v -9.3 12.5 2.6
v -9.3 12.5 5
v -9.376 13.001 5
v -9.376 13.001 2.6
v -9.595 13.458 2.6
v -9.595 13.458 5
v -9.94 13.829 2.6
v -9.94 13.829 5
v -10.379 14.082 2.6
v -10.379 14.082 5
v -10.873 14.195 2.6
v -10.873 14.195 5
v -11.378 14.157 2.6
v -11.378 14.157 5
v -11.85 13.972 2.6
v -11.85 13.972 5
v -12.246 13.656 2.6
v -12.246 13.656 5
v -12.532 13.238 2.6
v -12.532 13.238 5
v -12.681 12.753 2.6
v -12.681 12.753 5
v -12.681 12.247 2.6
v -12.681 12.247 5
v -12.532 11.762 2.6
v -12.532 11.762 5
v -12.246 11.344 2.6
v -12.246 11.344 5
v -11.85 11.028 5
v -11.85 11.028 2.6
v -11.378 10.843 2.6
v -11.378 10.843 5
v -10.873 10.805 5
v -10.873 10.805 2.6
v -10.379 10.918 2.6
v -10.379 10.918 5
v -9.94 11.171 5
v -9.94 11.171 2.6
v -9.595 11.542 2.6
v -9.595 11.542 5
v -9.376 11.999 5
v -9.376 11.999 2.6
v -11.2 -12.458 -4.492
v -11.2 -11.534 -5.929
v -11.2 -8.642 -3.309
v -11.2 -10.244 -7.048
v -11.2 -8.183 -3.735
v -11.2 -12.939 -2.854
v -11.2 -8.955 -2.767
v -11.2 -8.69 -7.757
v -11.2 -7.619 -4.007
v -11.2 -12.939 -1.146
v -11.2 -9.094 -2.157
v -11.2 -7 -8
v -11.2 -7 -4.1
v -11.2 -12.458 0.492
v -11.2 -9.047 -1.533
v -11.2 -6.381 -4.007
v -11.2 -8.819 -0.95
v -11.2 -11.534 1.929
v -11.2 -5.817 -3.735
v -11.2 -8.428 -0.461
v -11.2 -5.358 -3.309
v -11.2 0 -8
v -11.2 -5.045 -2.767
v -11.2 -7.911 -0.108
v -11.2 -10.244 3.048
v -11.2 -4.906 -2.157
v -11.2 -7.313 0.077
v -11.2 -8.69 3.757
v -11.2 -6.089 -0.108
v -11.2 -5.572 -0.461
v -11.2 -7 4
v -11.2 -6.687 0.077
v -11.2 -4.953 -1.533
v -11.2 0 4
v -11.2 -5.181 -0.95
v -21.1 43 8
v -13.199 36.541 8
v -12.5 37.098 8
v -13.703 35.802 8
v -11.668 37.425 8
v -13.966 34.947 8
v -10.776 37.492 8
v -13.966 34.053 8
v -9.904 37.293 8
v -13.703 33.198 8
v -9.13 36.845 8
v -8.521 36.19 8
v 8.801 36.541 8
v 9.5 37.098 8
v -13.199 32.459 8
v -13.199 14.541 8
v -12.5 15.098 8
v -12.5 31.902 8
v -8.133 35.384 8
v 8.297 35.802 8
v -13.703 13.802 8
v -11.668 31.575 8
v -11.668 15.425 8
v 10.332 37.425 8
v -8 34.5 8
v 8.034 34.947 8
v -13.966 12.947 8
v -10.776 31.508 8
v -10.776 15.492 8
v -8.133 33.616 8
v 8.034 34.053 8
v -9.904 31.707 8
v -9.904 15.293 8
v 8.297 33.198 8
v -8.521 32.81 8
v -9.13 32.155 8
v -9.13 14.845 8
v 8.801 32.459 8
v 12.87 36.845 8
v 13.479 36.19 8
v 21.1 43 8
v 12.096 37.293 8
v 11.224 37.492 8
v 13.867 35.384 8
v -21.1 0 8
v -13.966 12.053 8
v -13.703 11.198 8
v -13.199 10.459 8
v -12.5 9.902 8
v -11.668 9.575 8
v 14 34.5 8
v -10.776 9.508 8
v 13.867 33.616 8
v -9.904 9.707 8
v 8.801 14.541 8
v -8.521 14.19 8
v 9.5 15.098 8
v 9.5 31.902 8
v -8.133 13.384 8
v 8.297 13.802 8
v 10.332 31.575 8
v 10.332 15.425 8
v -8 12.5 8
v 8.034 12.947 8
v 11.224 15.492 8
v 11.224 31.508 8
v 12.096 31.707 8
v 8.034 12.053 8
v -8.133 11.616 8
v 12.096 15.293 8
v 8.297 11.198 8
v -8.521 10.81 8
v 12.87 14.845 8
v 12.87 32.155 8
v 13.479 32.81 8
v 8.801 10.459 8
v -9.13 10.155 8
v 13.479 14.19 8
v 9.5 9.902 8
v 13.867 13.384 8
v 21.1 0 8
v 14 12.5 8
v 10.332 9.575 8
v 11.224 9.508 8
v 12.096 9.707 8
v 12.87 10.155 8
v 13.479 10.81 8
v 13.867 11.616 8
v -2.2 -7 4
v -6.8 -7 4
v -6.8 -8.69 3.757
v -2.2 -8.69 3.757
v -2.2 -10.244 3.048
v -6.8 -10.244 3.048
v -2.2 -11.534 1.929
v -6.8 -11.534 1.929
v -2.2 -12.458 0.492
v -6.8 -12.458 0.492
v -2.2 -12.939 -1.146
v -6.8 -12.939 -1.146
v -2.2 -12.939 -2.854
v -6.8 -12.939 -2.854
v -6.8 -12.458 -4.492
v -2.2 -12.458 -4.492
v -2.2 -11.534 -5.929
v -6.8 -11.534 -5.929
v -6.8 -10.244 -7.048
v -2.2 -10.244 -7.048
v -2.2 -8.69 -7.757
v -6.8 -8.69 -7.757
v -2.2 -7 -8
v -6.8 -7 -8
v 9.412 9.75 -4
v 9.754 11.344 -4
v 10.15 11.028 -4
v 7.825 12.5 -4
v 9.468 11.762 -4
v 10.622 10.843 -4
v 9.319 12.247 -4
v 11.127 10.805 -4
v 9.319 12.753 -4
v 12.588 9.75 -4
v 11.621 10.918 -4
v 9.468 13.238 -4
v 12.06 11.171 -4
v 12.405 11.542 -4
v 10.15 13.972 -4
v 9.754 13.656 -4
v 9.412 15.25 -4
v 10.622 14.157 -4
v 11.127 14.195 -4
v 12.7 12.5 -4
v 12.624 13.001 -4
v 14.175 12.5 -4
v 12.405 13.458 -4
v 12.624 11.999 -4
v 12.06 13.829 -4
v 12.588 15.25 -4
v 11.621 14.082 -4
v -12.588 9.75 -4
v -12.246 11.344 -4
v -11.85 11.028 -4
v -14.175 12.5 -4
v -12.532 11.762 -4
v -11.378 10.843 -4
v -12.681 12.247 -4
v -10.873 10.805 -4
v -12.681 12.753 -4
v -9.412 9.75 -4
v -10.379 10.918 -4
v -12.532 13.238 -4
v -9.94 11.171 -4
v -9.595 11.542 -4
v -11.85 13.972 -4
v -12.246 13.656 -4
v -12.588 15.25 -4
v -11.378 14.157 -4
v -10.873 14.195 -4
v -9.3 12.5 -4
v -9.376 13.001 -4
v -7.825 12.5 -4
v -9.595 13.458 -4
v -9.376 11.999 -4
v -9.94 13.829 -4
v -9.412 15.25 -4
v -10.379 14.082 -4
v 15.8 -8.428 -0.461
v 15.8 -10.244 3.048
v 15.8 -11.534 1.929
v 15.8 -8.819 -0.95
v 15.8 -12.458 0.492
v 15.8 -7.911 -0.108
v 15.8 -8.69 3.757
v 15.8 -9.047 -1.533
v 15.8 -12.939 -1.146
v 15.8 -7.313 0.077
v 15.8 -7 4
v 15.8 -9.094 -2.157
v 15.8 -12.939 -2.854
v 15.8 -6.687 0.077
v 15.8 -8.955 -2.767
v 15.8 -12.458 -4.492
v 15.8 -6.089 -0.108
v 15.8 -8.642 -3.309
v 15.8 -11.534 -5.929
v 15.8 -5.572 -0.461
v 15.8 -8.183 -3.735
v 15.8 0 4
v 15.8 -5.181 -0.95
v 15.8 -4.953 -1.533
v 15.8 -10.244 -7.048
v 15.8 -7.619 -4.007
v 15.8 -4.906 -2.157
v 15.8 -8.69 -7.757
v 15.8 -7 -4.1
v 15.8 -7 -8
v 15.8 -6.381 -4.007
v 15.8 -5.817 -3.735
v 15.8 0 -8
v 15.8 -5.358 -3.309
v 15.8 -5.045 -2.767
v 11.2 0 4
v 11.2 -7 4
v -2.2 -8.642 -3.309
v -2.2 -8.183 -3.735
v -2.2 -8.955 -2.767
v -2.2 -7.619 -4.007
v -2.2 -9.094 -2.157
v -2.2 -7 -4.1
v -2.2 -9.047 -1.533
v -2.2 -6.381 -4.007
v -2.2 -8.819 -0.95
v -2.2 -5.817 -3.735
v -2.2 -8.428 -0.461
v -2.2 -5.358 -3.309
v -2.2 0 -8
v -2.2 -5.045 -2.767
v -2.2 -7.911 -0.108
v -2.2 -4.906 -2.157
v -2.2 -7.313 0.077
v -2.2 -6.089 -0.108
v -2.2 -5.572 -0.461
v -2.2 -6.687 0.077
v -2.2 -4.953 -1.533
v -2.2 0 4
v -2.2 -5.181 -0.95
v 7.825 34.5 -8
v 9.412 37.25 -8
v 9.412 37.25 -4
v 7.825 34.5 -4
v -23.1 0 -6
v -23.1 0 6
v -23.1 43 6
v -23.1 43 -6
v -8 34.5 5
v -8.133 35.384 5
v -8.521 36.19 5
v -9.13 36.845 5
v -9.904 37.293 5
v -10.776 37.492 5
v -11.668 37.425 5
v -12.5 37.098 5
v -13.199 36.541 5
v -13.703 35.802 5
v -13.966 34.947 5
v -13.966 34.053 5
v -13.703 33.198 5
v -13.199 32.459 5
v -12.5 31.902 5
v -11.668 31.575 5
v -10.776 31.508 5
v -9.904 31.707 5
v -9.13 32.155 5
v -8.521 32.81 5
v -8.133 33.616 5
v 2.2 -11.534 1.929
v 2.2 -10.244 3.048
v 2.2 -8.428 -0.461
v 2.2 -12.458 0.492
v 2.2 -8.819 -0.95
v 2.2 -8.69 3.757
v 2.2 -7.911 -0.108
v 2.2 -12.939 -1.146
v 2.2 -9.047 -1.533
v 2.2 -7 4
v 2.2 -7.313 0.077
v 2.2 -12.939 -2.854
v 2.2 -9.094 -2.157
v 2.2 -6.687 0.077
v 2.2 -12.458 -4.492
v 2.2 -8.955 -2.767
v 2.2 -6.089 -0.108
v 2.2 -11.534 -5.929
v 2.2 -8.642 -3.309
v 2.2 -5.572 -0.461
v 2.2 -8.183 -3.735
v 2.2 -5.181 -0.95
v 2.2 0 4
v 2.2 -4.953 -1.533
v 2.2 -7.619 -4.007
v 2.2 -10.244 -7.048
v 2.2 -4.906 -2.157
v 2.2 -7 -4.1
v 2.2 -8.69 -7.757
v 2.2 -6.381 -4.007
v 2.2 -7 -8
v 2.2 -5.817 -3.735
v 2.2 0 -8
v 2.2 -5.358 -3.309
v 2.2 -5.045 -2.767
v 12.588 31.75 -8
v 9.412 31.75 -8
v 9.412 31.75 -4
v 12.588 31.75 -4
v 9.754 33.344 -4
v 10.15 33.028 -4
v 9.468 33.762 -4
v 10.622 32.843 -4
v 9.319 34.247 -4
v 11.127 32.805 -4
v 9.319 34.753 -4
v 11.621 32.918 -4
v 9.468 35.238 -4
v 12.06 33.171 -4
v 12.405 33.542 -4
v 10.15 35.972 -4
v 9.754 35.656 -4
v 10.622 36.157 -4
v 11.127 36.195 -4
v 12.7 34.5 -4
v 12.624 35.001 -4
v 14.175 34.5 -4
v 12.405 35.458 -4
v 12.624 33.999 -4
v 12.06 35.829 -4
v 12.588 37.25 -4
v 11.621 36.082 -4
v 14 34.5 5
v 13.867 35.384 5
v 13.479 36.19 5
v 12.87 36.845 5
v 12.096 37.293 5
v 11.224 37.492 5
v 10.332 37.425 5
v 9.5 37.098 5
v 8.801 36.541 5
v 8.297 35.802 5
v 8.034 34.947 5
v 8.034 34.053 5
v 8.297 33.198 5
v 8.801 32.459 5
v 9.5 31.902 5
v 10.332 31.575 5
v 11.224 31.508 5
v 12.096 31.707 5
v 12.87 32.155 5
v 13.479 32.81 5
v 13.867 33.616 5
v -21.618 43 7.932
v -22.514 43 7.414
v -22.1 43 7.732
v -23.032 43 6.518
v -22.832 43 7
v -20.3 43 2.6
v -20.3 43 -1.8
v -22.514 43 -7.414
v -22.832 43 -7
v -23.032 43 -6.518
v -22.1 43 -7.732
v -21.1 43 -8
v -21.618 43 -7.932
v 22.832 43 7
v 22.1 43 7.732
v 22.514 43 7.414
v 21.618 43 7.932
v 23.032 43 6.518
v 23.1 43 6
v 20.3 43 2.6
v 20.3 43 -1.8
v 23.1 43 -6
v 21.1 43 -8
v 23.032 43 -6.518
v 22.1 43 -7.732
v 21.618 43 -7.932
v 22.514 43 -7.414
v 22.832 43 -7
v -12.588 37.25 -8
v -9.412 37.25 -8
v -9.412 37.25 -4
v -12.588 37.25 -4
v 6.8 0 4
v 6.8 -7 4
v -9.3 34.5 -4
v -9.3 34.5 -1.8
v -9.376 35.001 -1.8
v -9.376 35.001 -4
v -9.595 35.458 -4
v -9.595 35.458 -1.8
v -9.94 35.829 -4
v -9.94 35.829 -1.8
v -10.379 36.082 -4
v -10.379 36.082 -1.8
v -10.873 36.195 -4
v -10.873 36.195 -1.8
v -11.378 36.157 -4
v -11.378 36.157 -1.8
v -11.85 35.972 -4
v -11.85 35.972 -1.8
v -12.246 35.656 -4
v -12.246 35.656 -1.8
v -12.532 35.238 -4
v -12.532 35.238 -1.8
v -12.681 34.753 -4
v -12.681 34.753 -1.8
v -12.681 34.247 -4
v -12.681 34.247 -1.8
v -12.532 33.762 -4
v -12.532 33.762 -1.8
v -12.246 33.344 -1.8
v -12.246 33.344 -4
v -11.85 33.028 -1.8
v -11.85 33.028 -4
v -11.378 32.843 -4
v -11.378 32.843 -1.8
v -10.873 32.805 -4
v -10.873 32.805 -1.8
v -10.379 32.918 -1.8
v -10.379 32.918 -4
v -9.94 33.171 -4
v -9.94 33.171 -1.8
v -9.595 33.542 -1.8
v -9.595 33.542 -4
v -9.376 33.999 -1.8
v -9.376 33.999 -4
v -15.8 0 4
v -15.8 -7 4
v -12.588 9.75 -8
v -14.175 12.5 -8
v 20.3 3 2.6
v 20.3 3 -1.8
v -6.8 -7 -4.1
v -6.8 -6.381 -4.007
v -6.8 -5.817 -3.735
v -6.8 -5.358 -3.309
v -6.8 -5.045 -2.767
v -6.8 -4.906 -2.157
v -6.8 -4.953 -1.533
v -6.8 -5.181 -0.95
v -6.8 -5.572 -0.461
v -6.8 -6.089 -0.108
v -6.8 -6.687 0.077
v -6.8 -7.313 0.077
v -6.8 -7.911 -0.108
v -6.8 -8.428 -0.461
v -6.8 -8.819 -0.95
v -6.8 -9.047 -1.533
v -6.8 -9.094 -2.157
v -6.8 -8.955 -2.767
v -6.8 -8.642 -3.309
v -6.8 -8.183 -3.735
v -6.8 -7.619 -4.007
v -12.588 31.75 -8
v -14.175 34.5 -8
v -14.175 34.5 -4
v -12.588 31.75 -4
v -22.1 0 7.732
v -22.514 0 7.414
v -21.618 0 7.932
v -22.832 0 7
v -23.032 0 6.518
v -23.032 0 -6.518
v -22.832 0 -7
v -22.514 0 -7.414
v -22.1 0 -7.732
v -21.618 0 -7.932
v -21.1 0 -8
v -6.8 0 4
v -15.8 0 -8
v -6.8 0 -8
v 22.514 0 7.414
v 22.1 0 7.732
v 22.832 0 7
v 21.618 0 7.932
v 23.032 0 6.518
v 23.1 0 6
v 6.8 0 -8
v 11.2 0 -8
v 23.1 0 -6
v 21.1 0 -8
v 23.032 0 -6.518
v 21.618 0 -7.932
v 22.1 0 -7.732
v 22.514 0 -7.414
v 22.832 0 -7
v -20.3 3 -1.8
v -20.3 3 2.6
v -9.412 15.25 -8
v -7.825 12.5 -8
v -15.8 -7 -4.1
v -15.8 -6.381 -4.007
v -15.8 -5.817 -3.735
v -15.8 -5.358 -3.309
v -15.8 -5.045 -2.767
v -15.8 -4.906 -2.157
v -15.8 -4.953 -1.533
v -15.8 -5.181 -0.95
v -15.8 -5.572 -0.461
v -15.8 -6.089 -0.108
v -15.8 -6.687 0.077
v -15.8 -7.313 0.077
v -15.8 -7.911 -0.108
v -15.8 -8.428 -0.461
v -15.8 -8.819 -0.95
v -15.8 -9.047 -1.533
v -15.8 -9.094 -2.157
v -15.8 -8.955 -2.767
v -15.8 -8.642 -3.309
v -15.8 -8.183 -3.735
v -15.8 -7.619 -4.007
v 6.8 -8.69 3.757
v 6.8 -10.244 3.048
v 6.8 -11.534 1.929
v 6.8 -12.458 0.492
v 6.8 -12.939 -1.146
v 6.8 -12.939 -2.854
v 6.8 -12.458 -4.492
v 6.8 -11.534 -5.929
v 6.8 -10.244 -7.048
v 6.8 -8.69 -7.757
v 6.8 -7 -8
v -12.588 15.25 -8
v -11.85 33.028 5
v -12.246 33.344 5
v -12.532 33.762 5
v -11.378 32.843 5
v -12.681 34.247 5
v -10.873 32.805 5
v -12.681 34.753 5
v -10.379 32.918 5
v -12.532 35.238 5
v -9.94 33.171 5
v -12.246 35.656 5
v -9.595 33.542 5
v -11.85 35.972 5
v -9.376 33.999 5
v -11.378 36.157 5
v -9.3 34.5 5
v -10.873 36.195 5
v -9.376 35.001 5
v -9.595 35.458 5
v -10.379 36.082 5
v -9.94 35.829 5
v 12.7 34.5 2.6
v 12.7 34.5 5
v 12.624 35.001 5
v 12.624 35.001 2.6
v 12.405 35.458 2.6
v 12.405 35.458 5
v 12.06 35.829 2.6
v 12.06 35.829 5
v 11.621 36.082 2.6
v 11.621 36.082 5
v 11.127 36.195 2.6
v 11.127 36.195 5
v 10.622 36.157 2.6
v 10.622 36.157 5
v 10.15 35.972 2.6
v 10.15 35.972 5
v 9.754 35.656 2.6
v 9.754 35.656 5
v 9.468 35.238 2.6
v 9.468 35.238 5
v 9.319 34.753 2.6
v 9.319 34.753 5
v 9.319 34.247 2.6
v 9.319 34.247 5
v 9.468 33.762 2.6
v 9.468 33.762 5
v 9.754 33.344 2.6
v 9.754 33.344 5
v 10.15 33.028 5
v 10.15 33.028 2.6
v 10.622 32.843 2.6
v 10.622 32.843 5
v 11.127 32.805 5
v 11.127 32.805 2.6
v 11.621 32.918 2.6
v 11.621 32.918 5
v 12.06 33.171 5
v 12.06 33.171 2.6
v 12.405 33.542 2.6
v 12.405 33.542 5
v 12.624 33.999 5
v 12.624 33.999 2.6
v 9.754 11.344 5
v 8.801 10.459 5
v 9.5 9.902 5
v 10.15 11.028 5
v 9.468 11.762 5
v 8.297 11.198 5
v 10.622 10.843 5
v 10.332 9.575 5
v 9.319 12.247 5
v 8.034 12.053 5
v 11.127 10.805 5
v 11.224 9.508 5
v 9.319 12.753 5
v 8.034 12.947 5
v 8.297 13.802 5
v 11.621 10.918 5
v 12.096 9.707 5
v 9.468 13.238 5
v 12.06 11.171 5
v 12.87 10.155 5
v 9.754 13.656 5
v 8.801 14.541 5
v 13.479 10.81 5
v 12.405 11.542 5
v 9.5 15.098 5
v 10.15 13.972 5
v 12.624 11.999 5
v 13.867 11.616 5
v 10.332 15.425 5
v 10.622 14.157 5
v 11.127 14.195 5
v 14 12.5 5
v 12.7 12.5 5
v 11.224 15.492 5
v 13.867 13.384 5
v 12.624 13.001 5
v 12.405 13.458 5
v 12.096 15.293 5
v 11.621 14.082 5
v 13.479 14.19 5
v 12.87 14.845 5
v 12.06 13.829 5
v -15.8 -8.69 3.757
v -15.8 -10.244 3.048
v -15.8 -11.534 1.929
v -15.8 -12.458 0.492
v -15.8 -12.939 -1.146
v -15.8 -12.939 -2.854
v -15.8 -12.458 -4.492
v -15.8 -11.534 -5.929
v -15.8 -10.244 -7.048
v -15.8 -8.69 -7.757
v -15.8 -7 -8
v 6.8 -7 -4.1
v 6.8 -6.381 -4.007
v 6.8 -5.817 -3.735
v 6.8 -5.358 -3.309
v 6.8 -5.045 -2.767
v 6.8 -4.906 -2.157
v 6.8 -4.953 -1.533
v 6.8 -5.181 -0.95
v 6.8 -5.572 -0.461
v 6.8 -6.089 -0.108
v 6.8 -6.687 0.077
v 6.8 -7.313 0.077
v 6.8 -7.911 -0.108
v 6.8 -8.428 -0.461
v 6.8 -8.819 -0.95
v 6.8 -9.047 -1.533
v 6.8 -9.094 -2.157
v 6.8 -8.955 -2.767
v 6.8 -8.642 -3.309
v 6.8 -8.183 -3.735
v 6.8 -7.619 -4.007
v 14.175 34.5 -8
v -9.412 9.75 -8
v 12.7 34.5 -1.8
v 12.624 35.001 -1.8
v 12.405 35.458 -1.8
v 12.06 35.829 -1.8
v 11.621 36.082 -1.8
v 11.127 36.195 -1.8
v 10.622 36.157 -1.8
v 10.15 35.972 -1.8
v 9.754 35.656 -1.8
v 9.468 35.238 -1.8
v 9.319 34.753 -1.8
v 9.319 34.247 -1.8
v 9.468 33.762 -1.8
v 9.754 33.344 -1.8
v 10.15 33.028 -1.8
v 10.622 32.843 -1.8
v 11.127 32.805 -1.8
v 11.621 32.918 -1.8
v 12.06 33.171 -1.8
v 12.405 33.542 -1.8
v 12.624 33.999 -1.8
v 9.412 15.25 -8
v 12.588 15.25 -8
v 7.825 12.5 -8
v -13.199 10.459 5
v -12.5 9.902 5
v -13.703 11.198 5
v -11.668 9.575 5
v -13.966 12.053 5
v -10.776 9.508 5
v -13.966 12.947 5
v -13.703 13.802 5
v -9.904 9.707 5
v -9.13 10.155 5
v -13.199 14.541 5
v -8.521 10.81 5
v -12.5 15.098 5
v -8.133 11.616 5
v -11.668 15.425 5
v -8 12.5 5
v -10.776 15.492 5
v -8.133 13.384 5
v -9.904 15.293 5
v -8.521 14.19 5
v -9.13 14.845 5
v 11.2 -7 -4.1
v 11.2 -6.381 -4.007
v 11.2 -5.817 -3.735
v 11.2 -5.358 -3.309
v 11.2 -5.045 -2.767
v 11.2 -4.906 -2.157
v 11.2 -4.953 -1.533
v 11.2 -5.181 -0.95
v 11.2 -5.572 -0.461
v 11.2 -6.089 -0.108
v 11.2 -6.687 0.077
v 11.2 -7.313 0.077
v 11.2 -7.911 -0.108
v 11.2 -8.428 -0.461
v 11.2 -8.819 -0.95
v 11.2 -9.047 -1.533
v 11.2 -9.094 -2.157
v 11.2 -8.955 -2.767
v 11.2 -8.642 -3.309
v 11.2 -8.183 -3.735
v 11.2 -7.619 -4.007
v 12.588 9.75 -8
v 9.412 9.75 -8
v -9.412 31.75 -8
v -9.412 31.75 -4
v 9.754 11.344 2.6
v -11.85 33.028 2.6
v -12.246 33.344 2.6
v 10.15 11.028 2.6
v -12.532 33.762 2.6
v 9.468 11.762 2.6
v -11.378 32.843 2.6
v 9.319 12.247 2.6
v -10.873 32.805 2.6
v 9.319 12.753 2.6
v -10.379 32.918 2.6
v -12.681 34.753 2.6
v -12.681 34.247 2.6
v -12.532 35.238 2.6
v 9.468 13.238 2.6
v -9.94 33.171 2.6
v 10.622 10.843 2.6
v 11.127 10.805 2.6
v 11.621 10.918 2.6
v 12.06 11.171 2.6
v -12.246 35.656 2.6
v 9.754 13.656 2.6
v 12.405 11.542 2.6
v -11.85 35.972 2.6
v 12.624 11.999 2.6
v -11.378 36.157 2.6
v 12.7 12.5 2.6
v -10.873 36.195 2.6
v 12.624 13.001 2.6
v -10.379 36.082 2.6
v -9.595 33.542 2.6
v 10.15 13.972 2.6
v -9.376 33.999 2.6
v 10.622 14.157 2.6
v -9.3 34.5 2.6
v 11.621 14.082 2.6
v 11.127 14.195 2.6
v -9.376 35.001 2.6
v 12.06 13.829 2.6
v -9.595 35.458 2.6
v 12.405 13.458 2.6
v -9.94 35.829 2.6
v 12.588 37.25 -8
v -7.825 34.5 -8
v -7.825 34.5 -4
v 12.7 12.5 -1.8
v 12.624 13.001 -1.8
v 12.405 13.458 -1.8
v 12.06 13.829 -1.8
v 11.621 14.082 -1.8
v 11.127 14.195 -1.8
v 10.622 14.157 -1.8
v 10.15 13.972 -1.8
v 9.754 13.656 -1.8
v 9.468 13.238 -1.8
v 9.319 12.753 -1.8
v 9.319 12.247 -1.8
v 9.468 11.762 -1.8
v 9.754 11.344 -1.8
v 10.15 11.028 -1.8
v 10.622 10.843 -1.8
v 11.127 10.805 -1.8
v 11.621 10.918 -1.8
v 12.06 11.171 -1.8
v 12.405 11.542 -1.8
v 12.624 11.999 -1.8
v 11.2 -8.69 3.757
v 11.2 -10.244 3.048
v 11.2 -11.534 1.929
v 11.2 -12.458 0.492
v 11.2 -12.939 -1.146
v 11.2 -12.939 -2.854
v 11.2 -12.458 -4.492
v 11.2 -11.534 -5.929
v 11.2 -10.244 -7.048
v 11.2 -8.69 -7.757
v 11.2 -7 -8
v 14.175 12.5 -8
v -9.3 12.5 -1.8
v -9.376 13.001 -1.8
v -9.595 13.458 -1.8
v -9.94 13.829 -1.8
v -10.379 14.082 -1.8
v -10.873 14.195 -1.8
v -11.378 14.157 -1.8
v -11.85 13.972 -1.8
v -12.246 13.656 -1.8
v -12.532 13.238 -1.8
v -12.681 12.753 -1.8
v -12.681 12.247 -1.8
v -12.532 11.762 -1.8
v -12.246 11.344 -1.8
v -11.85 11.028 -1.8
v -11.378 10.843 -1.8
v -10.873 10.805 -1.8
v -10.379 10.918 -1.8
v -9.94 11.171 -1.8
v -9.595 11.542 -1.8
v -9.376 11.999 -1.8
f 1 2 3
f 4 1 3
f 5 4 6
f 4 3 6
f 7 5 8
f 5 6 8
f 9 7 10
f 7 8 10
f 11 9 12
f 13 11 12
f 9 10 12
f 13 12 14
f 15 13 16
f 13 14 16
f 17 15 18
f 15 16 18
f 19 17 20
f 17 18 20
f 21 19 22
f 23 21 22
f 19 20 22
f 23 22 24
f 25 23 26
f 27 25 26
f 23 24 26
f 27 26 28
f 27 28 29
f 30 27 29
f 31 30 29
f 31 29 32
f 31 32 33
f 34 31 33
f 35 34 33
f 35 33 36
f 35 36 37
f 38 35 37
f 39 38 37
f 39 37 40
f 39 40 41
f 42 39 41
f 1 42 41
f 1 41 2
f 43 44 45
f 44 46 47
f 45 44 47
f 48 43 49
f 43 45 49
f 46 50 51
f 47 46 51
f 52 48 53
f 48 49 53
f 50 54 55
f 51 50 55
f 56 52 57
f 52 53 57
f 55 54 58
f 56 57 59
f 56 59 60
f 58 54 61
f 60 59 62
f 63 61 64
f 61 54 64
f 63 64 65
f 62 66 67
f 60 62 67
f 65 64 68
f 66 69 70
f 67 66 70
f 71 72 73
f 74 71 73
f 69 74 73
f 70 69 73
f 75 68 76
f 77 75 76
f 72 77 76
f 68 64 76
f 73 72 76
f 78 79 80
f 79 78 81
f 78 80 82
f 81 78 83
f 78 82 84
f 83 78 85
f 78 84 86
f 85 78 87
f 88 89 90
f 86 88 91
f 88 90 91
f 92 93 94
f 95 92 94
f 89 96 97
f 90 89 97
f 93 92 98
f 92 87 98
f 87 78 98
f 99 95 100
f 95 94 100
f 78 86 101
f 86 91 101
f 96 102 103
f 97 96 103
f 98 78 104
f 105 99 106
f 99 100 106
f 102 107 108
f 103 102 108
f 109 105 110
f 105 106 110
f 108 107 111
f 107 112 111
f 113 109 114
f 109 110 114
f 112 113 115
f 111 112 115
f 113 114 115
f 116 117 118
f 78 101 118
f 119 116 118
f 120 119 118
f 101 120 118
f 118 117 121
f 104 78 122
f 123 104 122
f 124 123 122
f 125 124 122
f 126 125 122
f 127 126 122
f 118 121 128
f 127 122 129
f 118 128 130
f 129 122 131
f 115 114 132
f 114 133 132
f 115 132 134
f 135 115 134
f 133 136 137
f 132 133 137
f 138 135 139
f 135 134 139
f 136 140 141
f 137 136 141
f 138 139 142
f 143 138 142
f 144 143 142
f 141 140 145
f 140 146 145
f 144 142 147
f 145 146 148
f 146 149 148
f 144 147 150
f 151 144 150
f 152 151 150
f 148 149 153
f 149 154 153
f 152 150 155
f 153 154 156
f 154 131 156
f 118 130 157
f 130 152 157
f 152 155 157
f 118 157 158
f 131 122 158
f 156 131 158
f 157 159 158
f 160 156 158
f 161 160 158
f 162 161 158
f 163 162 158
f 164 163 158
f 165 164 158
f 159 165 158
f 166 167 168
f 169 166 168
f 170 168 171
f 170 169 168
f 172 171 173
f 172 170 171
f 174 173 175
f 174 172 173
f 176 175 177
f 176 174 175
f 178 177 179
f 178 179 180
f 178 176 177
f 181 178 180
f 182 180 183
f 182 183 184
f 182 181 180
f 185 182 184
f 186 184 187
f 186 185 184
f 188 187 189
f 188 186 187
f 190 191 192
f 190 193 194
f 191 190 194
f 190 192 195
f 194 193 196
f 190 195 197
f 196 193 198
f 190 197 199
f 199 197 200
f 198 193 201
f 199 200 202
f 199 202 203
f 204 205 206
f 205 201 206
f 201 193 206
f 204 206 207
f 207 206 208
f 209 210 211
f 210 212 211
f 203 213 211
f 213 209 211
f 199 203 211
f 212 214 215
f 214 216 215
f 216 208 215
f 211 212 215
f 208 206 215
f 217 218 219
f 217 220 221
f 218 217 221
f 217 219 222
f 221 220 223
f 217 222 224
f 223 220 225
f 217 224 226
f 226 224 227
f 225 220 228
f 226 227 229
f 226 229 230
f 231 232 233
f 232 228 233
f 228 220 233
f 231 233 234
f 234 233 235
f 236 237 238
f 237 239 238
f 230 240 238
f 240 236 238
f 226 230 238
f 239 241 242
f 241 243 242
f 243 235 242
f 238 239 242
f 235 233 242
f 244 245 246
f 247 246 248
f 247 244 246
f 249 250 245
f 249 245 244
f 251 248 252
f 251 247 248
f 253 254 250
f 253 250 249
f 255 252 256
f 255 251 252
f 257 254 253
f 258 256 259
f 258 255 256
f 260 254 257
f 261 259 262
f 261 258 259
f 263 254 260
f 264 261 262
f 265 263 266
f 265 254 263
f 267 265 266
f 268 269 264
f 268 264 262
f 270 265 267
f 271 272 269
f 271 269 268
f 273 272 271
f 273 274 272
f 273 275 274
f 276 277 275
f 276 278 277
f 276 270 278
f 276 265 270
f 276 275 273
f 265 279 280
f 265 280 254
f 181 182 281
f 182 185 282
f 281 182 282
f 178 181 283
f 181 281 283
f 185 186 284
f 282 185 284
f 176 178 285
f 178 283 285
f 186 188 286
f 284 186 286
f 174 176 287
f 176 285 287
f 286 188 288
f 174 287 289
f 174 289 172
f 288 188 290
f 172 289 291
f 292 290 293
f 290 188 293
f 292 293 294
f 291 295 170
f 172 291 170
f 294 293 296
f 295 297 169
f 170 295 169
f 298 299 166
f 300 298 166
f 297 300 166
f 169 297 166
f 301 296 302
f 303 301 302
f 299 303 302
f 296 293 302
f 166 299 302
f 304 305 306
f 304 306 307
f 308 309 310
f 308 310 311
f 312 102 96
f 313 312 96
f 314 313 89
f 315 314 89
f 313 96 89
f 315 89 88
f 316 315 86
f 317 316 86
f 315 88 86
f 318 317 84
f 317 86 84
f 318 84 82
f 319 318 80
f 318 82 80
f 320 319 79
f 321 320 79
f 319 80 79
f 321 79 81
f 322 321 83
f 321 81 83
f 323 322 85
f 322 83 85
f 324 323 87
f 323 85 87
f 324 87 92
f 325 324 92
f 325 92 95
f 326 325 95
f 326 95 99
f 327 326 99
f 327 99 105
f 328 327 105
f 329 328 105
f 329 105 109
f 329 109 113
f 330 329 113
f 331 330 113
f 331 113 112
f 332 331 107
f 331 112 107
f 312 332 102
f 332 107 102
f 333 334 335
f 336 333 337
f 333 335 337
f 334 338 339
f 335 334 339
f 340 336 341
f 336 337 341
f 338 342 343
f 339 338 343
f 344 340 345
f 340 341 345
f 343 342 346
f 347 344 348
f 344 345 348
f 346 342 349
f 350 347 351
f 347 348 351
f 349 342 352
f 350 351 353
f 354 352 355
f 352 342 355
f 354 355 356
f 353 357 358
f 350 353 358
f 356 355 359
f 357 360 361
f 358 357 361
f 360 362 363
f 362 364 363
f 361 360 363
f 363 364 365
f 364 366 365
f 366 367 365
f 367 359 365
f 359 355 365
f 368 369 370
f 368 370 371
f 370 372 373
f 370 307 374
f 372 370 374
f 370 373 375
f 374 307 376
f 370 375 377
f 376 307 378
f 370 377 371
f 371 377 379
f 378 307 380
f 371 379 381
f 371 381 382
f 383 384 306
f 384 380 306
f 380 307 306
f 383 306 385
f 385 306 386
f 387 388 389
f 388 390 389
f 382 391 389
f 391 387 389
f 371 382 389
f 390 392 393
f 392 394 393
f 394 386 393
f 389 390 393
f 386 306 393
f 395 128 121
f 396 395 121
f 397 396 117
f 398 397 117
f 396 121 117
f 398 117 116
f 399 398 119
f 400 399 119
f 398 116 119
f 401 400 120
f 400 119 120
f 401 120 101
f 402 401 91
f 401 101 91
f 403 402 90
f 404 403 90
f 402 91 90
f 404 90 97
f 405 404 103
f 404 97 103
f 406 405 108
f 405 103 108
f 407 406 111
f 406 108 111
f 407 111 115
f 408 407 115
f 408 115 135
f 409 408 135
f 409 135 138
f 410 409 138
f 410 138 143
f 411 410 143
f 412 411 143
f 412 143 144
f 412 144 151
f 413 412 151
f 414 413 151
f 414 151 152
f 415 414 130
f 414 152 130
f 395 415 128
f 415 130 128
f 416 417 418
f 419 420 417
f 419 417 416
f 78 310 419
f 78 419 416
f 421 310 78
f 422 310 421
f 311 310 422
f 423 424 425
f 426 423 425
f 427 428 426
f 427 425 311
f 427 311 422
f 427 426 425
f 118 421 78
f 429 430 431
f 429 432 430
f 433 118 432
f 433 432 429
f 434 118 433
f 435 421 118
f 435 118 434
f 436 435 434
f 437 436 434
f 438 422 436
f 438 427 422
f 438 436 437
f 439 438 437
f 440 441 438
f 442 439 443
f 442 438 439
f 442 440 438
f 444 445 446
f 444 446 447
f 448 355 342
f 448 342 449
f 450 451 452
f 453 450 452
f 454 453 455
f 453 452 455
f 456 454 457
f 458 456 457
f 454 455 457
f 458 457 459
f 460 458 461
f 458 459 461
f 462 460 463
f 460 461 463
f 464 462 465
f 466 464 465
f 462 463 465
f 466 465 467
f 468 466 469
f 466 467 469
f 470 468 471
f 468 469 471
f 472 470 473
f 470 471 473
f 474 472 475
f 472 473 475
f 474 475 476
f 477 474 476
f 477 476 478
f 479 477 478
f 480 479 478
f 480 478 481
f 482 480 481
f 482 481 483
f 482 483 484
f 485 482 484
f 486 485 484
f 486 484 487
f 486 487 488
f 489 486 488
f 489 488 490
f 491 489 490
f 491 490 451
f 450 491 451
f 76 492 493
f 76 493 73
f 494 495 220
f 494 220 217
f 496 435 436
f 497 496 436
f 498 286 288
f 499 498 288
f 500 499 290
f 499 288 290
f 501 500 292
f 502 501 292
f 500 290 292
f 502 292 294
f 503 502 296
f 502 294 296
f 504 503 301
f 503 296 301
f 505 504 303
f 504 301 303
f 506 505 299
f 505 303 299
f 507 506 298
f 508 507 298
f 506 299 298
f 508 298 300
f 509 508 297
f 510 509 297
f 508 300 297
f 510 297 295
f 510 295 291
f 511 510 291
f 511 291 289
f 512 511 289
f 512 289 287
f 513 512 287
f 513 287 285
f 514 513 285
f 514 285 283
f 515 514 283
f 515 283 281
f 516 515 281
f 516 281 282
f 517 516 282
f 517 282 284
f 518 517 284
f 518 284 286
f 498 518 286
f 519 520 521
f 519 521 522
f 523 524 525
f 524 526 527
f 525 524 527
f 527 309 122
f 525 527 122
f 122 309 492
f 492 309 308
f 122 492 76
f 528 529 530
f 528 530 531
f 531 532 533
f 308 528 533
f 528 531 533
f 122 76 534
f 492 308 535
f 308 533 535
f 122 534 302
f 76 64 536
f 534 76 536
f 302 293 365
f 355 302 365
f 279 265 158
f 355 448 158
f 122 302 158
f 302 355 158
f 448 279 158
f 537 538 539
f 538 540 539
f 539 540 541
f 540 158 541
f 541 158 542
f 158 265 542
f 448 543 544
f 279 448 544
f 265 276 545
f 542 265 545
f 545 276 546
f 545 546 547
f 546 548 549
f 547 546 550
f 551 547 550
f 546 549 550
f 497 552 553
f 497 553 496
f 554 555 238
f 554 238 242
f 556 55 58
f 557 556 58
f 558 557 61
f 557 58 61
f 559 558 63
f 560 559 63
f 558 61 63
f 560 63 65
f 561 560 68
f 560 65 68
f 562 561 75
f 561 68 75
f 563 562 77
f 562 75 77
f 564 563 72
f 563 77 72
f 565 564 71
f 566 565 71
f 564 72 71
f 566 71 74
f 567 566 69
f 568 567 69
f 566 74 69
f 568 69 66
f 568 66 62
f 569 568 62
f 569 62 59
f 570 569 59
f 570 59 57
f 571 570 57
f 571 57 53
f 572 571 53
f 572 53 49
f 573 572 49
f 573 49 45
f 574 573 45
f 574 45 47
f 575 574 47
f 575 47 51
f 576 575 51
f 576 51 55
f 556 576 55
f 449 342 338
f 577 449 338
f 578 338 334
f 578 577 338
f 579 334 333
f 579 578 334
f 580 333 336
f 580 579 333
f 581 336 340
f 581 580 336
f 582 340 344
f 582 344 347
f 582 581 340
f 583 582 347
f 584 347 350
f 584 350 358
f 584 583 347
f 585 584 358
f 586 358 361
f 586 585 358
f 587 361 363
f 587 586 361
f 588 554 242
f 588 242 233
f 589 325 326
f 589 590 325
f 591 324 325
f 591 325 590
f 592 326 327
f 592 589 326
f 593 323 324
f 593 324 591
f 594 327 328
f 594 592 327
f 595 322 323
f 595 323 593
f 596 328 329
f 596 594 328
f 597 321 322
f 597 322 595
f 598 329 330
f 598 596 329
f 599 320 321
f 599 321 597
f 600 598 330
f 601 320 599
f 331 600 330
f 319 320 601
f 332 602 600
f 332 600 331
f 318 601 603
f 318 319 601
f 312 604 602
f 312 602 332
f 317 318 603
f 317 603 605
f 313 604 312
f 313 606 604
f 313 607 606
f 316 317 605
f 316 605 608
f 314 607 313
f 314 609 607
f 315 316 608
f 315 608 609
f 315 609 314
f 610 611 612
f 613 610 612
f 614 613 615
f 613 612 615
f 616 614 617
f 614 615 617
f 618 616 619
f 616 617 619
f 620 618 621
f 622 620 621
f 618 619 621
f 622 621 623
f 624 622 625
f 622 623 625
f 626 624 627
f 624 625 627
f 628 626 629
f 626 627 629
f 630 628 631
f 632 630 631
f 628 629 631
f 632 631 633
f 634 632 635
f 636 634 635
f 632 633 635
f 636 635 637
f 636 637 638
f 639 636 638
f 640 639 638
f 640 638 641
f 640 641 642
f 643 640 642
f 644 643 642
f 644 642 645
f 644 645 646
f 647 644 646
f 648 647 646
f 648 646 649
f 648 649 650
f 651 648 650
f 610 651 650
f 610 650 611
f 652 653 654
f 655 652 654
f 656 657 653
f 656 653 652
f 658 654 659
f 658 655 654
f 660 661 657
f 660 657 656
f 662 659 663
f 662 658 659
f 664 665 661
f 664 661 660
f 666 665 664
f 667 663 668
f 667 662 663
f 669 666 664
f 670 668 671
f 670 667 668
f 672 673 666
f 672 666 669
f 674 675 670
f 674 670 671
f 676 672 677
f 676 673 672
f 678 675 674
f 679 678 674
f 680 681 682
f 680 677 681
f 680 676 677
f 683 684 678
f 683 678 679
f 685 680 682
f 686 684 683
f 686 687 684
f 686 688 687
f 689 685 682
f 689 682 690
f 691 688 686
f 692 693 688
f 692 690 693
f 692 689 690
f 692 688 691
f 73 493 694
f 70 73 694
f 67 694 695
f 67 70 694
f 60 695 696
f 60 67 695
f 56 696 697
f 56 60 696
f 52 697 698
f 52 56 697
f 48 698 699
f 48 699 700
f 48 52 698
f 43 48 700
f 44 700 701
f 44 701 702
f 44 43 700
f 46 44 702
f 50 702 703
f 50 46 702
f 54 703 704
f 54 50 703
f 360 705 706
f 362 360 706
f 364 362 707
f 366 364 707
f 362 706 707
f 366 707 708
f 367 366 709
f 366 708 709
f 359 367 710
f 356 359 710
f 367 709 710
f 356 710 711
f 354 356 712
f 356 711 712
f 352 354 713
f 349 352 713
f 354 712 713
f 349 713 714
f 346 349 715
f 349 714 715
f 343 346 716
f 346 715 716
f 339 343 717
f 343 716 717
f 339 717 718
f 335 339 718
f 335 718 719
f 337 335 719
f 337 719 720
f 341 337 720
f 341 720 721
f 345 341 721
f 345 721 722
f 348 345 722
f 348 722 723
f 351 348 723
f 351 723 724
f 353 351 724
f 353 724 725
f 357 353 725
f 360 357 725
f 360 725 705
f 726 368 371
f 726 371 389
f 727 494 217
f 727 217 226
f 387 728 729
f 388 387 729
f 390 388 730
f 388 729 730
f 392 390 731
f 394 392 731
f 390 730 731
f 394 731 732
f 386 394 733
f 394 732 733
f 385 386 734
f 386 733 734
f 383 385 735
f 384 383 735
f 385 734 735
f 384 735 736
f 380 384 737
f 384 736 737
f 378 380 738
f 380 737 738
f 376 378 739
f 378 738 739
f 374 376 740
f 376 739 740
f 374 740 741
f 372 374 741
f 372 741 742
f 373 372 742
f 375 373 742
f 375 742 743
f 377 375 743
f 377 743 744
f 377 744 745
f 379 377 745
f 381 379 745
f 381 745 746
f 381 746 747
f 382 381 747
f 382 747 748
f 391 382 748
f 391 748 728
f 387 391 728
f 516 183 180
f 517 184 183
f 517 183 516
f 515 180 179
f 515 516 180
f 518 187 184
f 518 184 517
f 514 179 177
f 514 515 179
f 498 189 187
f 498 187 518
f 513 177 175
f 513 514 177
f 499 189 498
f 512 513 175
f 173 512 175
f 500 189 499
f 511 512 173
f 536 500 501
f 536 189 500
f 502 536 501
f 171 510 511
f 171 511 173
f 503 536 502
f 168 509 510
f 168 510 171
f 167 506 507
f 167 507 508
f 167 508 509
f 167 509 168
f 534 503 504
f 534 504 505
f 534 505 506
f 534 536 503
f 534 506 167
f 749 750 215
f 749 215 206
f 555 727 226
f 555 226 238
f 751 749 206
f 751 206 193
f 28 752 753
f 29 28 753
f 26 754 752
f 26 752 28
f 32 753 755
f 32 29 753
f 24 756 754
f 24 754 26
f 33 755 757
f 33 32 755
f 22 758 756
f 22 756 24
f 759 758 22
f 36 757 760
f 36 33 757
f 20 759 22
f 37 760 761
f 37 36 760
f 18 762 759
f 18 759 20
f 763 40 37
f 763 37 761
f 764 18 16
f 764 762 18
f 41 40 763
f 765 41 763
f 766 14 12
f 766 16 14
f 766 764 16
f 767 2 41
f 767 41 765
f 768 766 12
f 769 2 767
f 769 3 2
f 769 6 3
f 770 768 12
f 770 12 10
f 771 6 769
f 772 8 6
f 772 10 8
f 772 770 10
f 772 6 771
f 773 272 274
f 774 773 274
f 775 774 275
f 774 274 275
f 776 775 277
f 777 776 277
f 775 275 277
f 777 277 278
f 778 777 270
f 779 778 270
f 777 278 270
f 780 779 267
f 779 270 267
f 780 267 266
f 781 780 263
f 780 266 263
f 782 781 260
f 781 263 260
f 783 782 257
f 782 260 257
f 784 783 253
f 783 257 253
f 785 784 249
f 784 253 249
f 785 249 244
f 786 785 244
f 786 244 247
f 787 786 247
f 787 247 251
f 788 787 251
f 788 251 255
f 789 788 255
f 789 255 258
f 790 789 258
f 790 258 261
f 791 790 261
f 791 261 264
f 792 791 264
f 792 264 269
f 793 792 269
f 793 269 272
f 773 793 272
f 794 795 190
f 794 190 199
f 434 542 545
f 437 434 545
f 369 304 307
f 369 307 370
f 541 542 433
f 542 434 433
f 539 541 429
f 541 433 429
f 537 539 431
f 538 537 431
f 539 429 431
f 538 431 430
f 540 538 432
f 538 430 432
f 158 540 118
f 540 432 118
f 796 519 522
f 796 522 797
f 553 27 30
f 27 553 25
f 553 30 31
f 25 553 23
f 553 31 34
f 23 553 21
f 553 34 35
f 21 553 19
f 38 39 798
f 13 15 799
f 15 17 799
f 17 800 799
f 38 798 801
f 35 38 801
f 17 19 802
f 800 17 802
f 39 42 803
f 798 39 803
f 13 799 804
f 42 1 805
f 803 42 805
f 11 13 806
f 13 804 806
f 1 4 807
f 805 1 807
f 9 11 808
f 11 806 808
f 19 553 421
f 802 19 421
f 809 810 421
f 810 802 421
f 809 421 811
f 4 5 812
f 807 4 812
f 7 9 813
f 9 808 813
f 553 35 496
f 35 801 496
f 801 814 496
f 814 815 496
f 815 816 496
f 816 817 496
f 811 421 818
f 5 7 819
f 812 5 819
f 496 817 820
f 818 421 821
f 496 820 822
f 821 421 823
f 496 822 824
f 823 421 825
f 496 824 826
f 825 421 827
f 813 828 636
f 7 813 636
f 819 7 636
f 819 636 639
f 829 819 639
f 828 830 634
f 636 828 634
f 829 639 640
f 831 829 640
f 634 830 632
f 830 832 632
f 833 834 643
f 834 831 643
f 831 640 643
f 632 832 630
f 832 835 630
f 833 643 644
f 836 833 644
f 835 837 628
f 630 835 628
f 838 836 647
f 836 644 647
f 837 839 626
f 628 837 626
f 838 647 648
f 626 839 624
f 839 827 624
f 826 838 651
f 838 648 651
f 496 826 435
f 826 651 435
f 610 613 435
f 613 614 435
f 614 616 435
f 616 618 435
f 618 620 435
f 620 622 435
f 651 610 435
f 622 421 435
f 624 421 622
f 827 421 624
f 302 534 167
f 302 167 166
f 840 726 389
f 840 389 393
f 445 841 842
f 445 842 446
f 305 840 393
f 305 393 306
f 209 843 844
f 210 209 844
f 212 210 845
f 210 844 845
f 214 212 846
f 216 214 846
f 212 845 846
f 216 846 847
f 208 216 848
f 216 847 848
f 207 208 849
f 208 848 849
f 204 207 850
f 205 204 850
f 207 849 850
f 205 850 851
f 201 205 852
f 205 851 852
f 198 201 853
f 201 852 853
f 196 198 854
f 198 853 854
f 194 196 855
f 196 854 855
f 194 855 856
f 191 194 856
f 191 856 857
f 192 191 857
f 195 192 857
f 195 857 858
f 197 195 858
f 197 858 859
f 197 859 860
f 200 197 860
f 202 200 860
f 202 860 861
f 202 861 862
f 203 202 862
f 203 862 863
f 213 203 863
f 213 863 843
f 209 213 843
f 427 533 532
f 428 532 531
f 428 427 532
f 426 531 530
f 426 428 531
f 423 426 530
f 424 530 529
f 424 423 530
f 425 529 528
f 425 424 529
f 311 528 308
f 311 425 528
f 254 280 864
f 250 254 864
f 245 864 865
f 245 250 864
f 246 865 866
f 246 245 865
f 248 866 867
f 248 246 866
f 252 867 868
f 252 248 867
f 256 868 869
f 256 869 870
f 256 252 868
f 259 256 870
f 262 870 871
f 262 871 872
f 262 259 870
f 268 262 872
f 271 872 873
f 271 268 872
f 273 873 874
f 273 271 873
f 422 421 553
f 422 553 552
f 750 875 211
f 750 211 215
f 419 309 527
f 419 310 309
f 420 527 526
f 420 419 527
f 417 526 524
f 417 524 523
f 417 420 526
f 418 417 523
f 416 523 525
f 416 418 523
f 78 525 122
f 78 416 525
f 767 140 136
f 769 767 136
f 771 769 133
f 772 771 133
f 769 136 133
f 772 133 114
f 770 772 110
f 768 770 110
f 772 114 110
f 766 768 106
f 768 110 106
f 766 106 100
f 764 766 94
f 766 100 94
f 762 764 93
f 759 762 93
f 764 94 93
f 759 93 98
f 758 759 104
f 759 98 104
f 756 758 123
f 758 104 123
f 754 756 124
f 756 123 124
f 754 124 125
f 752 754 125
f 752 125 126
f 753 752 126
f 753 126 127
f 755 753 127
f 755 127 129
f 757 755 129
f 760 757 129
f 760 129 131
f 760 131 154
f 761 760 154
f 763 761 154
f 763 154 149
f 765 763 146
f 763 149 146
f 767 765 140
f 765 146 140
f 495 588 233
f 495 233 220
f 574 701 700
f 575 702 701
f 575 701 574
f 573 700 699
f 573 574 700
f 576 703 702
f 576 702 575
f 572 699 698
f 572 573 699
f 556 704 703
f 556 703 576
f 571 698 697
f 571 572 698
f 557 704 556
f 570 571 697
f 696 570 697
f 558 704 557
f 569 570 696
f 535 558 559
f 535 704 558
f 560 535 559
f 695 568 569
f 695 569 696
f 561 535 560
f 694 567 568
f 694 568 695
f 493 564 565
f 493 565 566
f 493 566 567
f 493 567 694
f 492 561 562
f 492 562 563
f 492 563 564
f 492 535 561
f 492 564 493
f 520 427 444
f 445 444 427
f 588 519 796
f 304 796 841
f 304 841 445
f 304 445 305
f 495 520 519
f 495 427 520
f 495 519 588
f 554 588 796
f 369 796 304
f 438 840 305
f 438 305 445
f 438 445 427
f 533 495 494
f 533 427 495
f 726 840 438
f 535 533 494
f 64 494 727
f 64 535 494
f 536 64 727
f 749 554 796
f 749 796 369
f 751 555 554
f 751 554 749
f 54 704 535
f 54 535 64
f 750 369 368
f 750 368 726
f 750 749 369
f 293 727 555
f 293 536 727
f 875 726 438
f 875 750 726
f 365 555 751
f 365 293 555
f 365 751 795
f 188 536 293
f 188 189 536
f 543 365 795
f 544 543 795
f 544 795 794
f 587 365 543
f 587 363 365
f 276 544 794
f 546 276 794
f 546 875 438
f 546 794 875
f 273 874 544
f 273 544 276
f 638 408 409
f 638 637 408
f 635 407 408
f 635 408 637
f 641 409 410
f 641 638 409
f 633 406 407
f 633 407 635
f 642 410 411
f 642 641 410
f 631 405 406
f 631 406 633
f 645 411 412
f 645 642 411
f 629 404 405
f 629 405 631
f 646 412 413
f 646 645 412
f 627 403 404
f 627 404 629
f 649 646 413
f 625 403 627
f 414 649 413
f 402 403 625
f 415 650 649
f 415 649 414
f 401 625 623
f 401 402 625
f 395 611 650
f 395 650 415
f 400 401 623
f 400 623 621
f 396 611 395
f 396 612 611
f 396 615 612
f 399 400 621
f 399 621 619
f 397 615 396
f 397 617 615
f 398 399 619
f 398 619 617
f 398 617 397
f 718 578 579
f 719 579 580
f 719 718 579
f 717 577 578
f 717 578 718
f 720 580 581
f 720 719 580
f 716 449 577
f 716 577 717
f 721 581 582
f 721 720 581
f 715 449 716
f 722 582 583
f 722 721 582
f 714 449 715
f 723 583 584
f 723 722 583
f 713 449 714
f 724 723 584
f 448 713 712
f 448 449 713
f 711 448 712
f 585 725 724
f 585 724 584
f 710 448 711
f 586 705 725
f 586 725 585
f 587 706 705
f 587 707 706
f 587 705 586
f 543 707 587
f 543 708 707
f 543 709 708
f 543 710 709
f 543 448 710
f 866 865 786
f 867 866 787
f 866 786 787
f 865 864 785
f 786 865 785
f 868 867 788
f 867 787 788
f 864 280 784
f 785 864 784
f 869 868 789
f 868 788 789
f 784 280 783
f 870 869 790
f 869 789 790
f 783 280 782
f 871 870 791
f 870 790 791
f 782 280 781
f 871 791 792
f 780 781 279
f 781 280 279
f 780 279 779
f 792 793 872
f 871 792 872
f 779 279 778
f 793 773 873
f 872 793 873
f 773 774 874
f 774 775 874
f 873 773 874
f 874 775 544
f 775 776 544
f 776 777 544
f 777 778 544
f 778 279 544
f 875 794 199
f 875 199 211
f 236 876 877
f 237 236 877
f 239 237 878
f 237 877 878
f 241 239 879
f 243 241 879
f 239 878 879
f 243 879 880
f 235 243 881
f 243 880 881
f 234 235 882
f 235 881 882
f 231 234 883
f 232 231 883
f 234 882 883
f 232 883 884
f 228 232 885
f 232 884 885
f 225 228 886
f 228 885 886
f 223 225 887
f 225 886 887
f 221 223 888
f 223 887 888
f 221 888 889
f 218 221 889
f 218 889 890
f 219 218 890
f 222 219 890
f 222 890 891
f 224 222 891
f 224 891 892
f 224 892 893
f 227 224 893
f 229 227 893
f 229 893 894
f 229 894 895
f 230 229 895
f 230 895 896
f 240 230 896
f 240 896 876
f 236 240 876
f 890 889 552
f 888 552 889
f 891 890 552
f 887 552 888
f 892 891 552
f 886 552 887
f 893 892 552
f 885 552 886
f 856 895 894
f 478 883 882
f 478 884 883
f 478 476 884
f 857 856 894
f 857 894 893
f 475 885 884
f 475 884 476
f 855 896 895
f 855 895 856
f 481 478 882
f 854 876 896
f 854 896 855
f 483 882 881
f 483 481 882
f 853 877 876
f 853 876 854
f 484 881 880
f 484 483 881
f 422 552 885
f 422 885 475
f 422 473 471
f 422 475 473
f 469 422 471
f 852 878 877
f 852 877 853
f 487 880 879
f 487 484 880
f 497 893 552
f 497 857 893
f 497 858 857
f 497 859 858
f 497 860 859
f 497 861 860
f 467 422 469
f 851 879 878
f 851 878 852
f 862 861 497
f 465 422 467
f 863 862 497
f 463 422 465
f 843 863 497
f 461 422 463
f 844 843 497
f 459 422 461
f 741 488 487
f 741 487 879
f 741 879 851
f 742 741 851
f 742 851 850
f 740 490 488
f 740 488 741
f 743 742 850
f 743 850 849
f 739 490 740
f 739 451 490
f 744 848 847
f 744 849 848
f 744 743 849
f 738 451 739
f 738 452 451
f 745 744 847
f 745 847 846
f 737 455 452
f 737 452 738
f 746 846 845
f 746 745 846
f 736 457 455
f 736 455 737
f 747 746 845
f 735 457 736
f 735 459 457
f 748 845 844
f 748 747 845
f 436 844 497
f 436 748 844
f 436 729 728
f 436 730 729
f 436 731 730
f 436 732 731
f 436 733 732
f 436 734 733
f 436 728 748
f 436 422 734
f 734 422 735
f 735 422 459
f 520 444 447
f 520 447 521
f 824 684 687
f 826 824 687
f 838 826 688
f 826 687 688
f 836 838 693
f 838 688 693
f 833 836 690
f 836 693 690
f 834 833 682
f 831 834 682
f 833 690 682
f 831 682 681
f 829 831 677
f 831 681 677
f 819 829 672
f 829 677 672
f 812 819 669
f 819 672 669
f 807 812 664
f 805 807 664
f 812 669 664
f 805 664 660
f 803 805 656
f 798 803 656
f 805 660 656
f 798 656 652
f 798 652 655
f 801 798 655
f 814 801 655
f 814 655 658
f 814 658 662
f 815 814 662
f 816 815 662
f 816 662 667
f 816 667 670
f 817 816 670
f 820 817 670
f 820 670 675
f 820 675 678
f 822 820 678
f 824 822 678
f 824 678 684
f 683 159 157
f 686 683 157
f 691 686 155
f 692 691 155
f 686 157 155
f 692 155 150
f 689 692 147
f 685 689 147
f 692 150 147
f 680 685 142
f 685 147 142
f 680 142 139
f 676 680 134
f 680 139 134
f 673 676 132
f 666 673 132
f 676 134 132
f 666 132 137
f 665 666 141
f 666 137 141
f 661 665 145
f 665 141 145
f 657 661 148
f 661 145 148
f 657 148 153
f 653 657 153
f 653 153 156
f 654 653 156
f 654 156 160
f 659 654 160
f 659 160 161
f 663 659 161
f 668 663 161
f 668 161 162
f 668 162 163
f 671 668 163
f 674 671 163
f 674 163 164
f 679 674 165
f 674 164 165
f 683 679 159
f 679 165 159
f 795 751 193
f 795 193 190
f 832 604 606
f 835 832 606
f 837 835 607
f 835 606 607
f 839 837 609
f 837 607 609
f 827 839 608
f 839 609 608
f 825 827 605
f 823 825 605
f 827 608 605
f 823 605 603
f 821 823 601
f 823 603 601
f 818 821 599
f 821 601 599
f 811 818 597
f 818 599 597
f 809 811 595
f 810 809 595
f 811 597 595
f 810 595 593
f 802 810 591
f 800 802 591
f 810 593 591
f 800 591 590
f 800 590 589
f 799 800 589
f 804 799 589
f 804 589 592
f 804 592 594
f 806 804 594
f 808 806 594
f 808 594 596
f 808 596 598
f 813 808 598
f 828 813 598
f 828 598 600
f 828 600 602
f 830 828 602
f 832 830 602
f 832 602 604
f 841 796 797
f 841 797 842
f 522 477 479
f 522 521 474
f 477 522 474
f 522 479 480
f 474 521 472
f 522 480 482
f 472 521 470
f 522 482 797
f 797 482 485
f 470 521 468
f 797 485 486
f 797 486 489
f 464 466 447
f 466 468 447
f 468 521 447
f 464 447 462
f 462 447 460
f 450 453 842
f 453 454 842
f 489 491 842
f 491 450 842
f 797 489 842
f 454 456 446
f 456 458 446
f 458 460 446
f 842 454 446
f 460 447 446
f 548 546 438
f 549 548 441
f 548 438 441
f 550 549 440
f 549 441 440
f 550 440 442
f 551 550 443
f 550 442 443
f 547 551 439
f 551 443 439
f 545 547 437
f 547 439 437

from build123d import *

# Parameters (mm, degrees)
SKETCH1_W            = 46.2
SKETCH1_H            = 16
BOSS_EXTRUDE1_DEPTH  = 43
SKETCH2_W            = 4.6
SKETCH2_H            = 12
BOSS_EXTRUDE2_DEPTH  = 7
SKETCH8_R            = 6
BOSS_EXTRUDE3_DEPTH  = 4.6
LPATTERN1_COUNT      = 4
LPATTERN1_PITCH      = 9
SKETCH4_R            = 2.1
CUT_EXTRUDE1_DEPTH   = 39.9
SKETCH6_W            = 40.6
SKETCH6_H            = 4.4
CUT_EXTRUDE2_DEPTH   = 40
SKETCH9_R            = 1.7
CUT_EXTRUDE3_DEPTH   = 17
FILLET2_R            = 2
CUT_EXTRUDE4_DEPTH   = 4
LPATTERN2_COUNT      = 2
LPATTERN2_PITCH      = 22
LPATTERN2_COUNT_DIR2 = 2
LPATTERN2_PITCH_DIR2 = 22
SKETCH11_R           = 3
CUT_EXTRUDE5_DEPTH   = 3


with BuildPart() as part:
    # Sketch1 → Boss-Extrude1 (new body)
    with BuildSketch(Plane(origin=(0, 0, 0), x_dir=(1, 0, 0), z_dir=(0, 1, 0))):
        Rectangle(SKETCH1_W, SKETCH1_H)
    extrude(amount=BOSS_EXTRUDE1_DEPTH)

    # Sketch2 → Boss-Extrude2 (add)
    with BuildSketch(Plane.XZ):
        with Locations((13.5, -2)):
            Rectangle(SKETCH2_W, SKETCH2_H)
    boss_extrude2 = extrude(amount=BOSS_EXTRUDE2_DEPTH)

    # Sketch8 → Boss-Extrude3 (add)
    with BuildSketch(Plane(origin=(15.8, 0, 0), x_dir=(0, 0, -1), z_dir=(1, 0, 0))):
        with Locations((2, -7)):
            Circle(SKETCH8_R)
    boss_extrude3 = extrude(amount=-BOSS_EXTRUDE3_DEPTH)

    # LPattern1: Boss-Extrude2, Boss-Extrude3 ×4
    with Locations(*[(-i * LPATTERN1_PITCH, 0, 0) for i in range(1, LPATTERN1_COUNT)]):
        add(boss_extrude2)
        add(boss_extrude3)

    # Sketch4 → Cut-Extrude1 (cut, through all)
    with BuildSketch(Plane(origin=(15.8, 0, 0), x_dir=(0, 0, -1), z_dir=(1, 0, 0))):
        with Locations((2, -7)):
            Circle(SKETCH4_R)
    extrude(amount=-CUT_EXTRUDE1_DEPTH, mode=Mode.SUBTRACT)

    # Sketch6 → Cut-Extrude2 (cut)
    with BuildSketch(Plane(origin=(0, 43, 0), x_dir=(1, 0, 0), z_dir=(0, 1, 0))):
        with Locations((0, -0.4)):
            Rectangle(SKETCH6_W, SKETCH6_H)
    extrude(amount=-CUT_EXTRUDE2_DEPTH, mode=Mode.SUBTRACT)

    # Sketch9 → Cut-Extrude3 (cut, through all)
    with BuildSketch(Plane.XY.offset(8)):
        with Locations((11, 12.5)):
            Circle(SKETCH9_R)
        with Locations((-11, 12.5)):
            Circle(SKETCH9_R)
        with Locations((11, 34.5)):
            Circle(SKETCH9_R)
        with Locations((-11, 34.5)):
            Circle(SKETCH9_R)
    extrude(amount=-CUT_EXTRUDE3_DEPTH, mode=Mode.SUBTRACT)

    # Fillet2
    fillet2_edges = [part.edges().sort_by_distance(p)[0] for p in [
        (-23.1, 21.5, -8),
        (23.1, 21.5, -8),
        (23.1, 21.5, 8),
        (-23.1, 21.5, 8),
    ]]
    fillet(fillet2_edges, radius=FILLET2_R)

    # Sketch10 → Cut-Extrude4 (cut)
    with BuildSketch(Plane(origin=(0, 0, -8), x_dir=(-1, 0, 0), z_dir=(0, 0, -1))):
        Polygon((12.58771324, 9.75), (9.41228676, 9.75), (7.824573519, 12.5), (9.41228676, 15.25), (12.58771324, 15.25), (14.175426481, 12.5), align=None)
    cut_extrude4 = extrude(amount=-CUT_EXTRUDE4_DEPTH, mode=Mode.SUBTRACT)

    # LPattern2: Cut-Extrude4 2 × 2
    with Locations(*[(j * LPATTERN2_PITCH_DIR2, i * LPATTERN2_PITCH, 0) for i in range(LPATTERN2_COUNT) for j in range(LPATTERN2_COUNT_DIR2) if (i, j) != (0, 0)]):
        add(cut_extrude4, mode=Mode.SUBTRACT)

    # Sketch11 → Cut-Extrude5 (cut)
    with BuildSketch(Plane.XY.offset(8)):
        with Locations((11, 12.5)):
            Circle(SKETCH11_R)
        with Locations((-11, 12.5)):
            Circle(SKETCH11_R)
        with Locations((-11, 34.5)):
            Circle(SKETCH11_R)
        with Locations((11, 34.5)):
            Circle(SKETCH11_R)
    extrude(amount=-CUT_EXTRUDE5_DEPTH, mode=Mode.SUBTRACT)


solid = part.part
